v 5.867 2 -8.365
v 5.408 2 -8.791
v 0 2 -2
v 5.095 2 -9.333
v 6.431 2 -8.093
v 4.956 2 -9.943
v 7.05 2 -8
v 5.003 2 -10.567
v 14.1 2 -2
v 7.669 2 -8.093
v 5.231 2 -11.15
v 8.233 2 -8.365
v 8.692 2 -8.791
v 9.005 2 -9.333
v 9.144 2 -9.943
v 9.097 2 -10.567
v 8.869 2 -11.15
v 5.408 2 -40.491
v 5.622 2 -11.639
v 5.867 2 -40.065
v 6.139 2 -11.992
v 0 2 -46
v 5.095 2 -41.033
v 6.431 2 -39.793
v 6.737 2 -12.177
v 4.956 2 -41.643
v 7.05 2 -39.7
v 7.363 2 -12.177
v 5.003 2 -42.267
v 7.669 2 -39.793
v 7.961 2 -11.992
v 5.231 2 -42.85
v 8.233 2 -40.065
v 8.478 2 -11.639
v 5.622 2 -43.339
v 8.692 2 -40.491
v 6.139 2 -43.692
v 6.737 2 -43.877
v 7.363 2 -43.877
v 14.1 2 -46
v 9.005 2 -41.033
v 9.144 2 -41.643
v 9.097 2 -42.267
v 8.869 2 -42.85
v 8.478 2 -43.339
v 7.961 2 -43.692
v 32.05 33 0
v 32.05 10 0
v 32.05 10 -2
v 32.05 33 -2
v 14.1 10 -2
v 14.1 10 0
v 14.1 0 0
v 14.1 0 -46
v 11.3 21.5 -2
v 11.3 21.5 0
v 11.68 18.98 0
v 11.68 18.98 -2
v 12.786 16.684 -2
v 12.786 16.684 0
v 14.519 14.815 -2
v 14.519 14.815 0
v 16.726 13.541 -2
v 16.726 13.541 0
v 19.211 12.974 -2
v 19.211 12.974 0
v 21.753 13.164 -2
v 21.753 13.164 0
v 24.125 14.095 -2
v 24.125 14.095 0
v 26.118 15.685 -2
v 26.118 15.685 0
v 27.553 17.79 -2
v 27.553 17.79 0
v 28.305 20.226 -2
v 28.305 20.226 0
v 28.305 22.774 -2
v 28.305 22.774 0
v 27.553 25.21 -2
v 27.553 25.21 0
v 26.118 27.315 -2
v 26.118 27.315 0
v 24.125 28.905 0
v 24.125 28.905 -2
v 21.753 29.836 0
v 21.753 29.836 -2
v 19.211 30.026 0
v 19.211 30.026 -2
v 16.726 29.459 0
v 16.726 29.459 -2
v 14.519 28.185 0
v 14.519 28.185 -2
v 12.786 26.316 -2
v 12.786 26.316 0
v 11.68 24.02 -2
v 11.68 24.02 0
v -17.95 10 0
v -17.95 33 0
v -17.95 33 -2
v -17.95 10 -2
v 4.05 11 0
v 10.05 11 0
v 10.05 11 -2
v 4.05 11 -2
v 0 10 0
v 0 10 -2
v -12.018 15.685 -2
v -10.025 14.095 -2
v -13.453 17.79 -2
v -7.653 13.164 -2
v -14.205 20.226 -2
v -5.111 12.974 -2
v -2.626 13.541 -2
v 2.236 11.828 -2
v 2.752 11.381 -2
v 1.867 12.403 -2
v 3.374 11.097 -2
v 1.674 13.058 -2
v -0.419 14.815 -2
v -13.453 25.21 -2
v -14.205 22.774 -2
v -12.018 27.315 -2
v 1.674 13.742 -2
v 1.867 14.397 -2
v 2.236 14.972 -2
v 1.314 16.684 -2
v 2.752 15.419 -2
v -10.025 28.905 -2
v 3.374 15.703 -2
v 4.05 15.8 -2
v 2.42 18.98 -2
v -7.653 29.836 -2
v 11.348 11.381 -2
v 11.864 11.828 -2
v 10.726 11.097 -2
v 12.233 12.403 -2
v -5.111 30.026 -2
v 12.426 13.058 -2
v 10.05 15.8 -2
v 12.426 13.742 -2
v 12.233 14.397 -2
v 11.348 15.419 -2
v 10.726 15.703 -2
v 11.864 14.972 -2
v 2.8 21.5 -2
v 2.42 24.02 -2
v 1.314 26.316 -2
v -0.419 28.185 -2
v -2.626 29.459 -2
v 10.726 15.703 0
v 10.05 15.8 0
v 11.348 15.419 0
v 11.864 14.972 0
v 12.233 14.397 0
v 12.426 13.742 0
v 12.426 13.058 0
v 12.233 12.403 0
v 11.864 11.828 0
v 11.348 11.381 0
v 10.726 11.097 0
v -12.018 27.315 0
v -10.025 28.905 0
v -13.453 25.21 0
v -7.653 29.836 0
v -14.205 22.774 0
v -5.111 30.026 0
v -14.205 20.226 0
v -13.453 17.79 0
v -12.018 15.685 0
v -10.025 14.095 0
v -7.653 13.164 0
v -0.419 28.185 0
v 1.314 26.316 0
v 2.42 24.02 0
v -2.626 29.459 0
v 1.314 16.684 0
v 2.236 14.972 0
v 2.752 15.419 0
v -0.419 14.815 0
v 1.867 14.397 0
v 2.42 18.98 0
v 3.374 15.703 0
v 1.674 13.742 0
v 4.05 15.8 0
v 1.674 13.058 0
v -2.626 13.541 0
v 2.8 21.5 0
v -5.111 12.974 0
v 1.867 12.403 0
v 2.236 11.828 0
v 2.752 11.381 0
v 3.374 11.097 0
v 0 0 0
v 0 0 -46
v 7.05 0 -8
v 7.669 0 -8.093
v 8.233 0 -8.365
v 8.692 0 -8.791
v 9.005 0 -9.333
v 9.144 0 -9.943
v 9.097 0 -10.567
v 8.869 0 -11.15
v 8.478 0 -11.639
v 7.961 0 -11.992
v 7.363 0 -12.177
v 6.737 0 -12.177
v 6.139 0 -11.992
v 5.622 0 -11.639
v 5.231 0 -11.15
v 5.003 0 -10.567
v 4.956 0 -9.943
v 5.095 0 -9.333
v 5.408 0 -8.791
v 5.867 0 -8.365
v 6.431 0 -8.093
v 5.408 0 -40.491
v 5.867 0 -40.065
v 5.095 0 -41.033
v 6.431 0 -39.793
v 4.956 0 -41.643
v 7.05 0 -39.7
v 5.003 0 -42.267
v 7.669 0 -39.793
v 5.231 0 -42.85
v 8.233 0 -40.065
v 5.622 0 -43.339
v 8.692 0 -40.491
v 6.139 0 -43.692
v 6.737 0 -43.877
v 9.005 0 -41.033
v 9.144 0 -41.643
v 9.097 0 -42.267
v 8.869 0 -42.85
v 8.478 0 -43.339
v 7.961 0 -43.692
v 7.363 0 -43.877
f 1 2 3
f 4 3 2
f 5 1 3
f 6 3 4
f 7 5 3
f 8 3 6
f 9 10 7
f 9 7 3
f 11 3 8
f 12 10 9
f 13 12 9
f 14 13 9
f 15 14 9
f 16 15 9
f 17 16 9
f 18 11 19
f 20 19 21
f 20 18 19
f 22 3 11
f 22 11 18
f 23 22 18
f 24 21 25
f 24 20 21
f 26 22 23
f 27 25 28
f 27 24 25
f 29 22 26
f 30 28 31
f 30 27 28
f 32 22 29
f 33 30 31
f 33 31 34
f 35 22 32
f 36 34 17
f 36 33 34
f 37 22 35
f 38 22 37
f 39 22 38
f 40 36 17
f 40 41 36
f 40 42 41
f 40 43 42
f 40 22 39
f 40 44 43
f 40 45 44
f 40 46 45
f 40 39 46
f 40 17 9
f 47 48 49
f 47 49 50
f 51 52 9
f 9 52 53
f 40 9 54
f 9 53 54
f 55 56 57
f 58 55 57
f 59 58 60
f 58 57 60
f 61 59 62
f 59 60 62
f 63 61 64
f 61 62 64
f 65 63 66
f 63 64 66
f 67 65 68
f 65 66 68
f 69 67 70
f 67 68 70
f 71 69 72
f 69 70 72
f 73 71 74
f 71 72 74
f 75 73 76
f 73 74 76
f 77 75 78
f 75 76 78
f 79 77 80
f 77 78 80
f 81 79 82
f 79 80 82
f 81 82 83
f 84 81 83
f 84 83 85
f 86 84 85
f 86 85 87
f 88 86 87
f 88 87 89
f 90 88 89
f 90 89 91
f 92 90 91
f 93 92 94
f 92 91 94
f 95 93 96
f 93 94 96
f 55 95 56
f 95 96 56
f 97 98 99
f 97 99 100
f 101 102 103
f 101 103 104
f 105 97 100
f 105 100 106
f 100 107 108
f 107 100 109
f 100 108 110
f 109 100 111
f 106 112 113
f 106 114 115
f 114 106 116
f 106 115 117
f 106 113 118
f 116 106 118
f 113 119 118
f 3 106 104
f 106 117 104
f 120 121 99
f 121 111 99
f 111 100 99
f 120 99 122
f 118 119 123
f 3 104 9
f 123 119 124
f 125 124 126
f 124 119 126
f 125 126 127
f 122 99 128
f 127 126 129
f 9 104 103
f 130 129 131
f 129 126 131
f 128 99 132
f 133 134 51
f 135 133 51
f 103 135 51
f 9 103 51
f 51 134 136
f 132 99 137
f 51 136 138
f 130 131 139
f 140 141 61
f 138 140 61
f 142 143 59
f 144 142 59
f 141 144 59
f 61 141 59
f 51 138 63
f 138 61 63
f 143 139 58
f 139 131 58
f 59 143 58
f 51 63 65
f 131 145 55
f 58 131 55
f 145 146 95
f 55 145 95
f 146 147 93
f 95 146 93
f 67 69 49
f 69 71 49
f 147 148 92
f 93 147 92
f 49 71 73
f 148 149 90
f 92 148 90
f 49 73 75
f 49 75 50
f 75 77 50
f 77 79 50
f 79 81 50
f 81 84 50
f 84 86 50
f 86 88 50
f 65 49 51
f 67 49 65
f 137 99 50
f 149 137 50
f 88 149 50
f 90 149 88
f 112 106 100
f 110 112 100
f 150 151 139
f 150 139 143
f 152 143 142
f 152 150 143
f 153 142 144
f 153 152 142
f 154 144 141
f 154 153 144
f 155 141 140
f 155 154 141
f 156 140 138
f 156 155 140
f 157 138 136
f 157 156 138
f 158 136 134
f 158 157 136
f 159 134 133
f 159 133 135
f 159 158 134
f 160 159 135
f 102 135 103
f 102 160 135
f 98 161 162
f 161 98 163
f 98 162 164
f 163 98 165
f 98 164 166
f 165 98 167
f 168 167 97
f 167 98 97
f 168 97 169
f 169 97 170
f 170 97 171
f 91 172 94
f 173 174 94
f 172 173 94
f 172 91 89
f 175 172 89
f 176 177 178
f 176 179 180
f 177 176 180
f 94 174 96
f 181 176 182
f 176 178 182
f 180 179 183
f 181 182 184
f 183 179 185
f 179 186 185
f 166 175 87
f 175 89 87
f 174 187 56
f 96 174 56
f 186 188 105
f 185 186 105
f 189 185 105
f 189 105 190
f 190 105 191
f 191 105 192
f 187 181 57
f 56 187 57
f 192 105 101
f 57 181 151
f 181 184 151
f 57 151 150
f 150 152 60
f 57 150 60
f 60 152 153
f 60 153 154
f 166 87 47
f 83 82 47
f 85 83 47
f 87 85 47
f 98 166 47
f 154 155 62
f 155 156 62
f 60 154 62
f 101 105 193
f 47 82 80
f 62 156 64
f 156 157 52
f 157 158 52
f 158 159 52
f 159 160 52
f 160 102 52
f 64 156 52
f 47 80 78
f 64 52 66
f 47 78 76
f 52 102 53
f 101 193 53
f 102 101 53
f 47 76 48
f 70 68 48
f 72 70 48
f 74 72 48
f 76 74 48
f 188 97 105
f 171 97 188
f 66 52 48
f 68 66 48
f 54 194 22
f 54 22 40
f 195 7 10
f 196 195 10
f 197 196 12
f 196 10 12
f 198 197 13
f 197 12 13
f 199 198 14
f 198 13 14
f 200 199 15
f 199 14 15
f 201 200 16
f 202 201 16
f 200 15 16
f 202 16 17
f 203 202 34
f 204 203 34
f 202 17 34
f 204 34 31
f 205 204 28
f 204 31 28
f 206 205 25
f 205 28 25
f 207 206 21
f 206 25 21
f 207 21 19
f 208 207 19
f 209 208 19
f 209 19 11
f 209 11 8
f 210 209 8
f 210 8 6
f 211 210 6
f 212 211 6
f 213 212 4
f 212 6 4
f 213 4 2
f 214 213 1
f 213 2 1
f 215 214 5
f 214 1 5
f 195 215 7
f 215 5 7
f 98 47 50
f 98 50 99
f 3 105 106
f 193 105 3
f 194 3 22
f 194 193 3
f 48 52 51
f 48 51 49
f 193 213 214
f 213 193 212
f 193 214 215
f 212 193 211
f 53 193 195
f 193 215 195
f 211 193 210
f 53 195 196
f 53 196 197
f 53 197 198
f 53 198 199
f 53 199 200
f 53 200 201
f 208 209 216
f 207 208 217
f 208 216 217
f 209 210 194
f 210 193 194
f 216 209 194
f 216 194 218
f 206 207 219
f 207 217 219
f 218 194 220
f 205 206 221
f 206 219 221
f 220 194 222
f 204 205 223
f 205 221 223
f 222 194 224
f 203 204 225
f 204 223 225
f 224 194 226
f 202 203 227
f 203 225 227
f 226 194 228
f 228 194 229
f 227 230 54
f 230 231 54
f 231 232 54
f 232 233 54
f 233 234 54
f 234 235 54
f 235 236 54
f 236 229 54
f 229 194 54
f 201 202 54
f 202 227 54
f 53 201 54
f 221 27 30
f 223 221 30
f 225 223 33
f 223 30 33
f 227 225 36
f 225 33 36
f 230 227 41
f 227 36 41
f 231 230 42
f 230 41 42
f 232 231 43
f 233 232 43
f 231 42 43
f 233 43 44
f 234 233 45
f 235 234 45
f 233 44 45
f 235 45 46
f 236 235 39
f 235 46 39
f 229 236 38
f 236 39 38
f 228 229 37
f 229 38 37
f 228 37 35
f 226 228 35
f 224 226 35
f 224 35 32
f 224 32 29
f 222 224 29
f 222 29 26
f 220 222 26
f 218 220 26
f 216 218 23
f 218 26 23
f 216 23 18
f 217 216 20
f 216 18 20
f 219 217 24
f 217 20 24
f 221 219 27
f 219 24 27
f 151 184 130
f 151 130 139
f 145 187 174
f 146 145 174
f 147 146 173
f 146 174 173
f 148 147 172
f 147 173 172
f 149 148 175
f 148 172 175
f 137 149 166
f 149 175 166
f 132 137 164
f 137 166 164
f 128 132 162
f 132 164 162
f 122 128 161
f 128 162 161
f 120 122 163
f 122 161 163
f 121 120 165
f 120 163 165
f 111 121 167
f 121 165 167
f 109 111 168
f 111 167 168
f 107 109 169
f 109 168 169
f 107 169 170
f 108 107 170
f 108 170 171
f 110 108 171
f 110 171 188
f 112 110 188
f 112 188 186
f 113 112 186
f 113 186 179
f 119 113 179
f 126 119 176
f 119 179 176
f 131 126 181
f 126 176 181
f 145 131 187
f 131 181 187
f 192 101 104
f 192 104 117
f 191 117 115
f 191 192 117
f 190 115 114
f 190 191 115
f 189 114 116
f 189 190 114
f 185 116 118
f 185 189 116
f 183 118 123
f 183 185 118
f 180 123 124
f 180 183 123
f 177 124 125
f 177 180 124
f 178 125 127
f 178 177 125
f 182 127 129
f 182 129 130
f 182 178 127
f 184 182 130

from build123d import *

# Parameters (mm, degrees)
BASEESB_W      = 14.1
BASEESB_H      = 46
BASE_DEPTH     = 2
FUROSFIXESB_R  = 2.1
FUROSFIX_DEPTH = 2
HOLDER_DEPTH   = 2
FUROSUSESB_R   = 8.55
FUROSUS_DEPTH  = 2


with BuildPart() as part:
    # baseEsb → base (new body)
    with BuildSketch(Plane(origin=(0, 0, 0), x_dir=(1, 0, 0), z_dir=(0, 1, 0))):
        with Locations((7.05, 23)):
            Rectangle(BASEESB_W, BASEESB_H)
    extrude(amount=BASE_DEPTH)

    # furosFixEsb → furosFix (cut)
    with BuildSketch(Plane(origin=(0, 2, 0), x_dir=(1, 0, 0), z_dir=(0, 1, 0))):
        with Locations(Location((7.05, 10.1, 0), (0, 0, 270))):
            Circle(FUROSFIXESB_R)
        with Locations(Location((7.05, 41.8, 0), (0, 0, 270))):
            Circle(FUROSFIXESB_R)
    extrude(amount=-FUROSFIX_DEPTH, mode=Mode.SUBTRACT)

    # holderEsb → holder (add)
    with BuildSketch(Plane.XY):
        Polygon((0, 0), (14.1, 0), (14.1, 10), (32.05, 10), (32.05, 33), (-17.95, 33), (-17.95, 10), (0, 10), align=None)
    extrude(amount=-HOLDER_DEPTH)

    # furosUSesb → furosUS (cut)
    with BuildSketch(Plane.XY):
        with Locations((-5.75, 21.5)):
            Circle(FUROSUSESB_R)
        with Locations(Location((19.85, 21.5, 0), (0, 0, 180))):
            Circle(FUROSUSESB_R)
        with BuildLine():
            Line((4.05, 15.8), (10.05, 15.8))
            ThreePointArc((10.05, 15.8), (12.45, 13.4), (10.05, 11))
            Line((10.05, 11), (4.05, 11))
            ThreePointArc((4.05, 11), (1.65, 13.4), (4.05, 15.8))
        make_face()
    extrude(amount=-FUROSUS_DEPTH, mode=Mode.SUBTRACT)


solid = part.part
